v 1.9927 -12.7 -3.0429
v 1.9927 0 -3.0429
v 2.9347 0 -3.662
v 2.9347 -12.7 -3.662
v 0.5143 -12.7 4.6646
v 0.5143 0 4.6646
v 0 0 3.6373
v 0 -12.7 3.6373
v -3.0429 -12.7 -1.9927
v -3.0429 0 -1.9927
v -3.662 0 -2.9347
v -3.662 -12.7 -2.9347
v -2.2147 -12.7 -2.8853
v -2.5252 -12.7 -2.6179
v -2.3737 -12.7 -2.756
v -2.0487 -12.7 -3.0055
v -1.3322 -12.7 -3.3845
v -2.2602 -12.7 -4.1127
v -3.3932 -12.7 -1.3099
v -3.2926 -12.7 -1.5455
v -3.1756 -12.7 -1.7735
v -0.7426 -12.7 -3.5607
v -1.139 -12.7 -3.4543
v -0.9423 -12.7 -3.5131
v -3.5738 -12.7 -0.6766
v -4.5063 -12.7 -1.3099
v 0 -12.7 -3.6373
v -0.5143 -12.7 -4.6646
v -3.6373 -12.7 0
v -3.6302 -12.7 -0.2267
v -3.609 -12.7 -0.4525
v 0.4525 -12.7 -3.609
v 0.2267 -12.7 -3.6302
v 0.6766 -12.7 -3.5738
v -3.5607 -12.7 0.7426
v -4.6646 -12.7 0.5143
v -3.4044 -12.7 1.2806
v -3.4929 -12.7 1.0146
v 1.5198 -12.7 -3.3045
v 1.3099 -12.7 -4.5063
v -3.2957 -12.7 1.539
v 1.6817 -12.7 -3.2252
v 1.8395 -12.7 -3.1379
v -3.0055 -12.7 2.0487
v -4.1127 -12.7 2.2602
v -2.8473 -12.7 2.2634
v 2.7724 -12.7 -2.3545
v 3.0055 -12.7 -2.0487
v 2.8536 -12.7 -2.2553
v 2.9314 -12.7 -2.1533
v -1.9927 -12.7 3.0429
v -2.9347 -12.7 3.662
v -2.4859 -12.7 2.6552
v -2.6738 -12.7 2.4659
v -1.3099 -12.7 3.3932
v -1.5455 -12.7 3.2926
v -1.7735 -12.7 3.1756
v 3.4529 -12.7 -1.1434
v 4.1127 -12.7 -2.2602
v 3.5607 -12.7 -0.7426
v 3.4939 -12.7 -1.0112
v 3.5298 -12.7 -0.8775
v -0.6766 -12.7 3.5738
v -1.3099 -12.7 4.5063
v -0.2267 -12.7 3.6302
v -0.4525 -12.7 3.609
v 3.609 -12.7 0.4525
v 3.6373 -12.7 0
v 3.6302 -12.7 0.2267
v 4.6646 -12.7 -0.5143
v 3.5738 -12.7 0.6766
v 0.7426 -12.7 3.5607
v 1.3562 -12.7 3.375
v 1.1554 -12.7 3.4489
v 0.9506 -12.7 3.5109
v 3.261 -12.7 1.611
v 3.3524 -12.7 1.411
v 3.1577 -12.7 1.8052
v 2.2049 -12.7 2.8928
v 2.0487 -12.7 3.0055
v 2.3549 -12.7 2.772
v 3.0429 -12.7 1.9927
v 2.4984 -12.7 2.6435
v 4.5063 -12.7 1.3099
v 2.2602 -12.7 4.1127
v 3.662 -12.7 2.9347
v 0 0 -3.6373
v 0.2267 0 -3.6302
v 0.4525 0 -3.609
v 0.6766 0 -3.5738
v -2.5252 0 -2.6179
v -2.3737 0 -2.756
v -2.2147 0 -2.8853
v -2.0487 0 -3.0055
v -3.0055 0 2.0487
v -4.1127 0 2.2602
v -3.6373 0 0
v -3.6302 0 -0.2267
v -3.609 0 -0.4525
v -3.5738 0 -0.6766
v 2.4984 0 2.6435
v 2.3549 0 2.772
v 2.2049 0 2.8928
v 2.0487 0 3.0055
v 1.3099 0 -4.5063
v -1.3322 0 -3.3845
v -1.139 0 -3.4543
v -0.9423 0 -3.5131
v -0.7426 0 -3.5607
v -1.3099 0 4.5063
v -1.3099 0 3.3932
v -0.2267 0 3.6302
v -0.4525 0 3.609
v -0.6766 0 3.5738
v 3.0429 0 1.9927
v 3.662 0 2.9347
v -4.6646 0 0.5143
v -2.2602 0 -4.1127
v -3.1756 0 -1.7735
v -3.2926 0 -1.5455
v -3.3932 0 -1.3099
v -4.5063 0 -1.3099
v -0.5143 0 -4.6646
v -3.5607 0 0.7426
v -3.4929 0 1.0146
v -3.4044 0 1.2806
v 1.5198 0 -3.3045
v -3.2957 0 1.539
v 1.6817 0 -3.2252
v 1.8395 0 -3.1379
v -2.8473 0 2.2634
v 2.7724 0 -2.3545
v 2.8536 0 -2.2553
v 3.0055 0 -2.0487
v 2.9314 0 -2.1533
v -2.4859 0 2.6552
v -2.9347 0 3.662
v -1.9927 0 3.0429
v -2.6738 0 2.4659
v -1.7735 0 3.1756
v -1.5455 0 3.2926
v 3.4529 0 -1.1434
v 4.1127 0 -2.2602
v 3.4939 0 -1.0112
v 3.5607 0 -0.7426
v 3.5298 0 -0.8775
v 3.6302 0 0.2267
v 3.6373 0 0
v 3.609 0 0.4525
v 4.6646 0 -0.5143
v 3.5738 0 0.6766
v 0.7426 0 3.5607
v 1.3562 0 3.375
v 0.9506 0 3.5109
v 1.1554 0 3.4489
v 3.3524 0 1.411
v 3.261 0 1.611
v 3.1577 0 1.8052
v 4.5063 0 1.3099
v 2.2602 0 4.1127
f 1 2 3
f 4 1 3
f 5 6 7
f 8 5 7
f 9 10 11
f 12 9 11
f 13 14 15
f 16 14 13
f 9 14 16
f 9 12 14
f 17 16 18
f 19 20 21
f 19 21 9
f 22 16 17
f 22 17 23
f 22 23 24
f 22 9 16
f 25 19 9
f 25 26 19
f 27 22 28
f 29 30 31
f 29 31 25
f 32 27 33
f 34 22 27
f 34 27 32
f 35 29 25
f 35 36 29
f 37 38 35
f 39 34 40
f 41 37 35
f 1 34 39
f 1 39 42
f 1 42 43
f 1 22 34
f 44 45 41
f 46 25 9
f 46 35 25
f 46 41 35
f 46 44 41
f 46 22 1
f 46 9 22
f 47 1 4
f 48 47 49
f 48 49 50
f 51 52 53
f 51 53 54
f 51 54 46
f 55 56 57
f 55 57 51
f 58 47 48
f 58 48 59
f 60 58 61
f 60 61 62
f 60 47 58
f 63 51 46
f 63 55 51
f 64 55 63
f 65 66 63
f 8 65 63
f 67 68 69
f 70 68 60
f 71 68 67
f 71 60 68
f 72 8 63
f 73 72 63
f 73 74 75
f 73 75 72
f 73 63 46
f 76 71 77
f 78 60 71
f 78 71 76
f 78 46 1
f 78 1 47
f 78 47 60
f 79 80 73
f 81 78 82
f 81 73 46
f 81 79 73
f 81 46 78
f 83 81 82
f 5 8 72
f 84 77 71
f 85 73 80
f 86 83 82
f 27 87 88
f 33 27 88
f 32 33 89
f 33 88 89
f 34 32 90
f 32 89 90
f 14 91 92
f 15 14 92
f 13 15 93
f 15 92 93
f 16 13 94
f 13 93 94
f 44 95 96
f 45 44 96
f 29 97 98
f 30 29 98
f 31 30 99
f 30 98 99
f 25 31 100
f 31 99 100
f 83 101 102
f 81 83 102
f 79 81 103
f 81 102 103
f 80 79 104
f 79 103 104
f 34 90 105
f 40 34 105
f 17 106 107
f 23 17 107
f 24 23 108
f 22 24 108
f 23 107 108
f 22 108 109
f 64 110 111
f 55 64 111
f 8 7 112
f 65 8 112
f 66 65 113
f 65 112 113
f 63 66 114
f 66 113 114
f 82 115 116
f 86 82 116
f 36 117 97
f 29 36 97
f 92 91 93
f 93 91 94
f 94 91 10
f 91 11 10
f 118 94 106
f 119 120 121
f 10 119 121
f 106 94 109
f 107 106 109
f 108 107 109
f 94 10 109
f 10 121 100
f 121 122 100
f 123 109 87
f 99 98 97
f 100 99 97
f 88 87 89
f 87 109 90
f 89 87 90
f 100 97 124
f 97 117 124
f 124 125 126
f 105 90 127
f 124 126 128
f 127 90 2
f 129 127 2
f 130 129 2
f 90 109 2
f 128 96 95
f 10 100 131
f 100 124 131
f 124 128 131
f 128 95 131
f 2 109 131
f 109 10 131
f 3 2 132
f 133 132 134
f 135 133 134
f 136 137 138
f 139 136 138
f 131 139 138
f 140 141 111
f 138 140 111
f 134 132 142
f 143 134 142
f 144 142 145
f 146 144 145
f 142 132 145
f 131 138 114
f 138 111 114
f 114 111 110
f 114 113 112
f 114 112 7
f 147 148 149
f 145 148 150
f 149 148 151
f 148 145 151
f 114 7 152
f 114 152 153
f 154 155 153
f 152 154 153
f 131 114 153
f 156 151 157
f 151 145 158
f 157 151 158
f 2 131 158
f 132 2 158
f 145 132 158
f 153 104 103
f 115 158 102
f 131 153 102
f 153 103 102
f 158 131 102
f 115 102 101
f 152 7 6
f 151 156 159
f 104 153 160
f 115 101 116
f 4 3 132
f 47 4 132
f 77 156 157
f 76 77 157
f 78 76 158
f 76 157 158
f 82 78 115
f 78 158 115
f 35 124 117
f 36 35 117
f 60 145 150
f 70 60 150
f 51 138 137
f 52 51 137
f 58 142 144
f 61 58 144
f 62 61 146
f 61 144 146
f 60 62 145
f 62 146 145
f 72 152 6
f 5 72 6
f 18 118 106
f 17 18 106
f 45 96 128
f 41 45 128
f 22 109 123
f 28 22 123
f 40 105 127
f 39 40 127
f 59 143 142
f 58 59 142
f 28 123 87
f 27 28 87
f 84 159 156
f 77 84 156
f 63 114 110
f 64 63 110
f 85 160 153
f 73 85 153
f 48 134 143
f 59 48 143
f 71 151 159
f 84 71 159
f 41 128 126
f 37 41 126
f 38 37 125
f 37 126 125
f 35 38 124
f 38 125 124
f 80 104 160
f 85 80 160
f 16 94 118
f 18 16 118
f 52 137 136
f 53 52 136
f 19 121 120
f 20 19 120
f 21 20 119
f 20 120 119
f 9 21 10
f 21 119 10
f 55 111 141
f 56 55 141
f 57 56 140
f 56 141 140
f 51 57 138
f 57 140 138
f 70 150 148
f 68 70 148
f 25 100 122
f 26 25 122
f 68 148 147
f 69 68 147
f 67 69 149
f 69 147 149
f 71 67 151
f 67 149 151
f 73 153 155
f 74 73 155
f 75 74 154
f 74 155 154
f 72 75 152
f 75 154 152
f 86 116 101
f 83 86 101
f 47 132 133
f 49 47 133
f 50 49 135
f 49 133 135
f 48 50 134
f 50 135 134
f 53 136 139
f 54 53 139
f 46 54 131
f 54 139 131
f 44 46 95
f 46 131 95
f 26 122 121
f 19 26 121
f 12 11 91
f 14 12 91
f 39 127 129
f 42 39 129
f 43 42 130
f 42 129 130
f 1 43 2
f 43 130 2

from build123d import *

# Parameters (mm, degrees)
F1_DEPTH = 12.7


with BuildPart() as f1:
    # F0 (on Front) → F1 (new body)
    with BuildSketch(Plane.XZ):
        with BuildLine():
            ThreePointArc((3.5606706706, -0.7425834457), (3.6180769765, -0.3732623619), (3.63728, 0))
            ThreePointArc((3.63728, 0), (3.6213765163, 0.3397615722), (3.5738051364, 0.6765520271))
            ThreePointArc((3.5738051364, 0.6765520271), (3.4825423587, 1.0496211309), (3.3524499928, 1.4109871879))
            ThreePointArc((3.3524499928, 1.4109871879), (3.2108553593, 1.7088632654), (3.0428601668, 1.9926885867))
            ThreePointArc((3.0428601668, 1.9926885867), (2.7896517807, 2.3340198673), (2.498357335, 2.6434856582))
            ThreePointArc((2.498357335, 2.6434856582), (2.2807047164, 2.8334063942), (2.0486673204, 3.0054563728))
            ThreePointArc((2.0486673204, 3.0054563728), (1.7124143827, 3.2089628823), (1.3561660359, 3.3749991824))
            ThreePointArc((1.3561660359, 3.3749991824), (1.0534732185, 3.4813790337), (0.7425834457, 3.5606706706))
            Line((0.7425834457, 3.5606706706), (0, 3.63728))
            ThreePointArc((0, 3.63728), (-0.3397615722, 3.6213765163), (-0.6765520271, 3.5738051364))
            ThreePointArc((-0.6765520271, 3.5738051364), (-0.7247312416, 3.5643471248), (-0.7727783981, 3.5542396298))
            ThreePointArc((-0.7727783981, 3.5542396298), (-1.0444322734, 3.4841020399), (-1.3098719531, 3.3932346316))
            ThreePointArc((-1.3098719531, 3.3932346316), (-1.6605472279, 3.2361070289), (-1.9926885867, 3.0428601668))
            ThreePointArc((-1.9926885867, 3.0428601668), (-2.2476575865, 2.8596924961), (-2.4858819563, 2.6552206496))
            ThreePointArc((-2.4858819563, 2.6552206496), (-2.7623678061, 2.3662480643), (-3.0054563728, 2.0486673204))
            ThreePointArc((-3.0054563728, 2.0486673204), (-3.1608520437, 1.7996722357), (-3.2956657104, 1.5389585191))
            ThreePointArc((-3.2956657104, 1.5389585191), (-3.451215794, 1.1484403953), (-3.5606706706, 0.7425834457))
            ThreePointArc((-3.5606706706, 0.7425834457), (-3.6180769765, 0.3732623619), (-3.63728, 0))
            ThreePointArc((-3.63728, 0), (-3.6213765163, -0.3397615722), (-3.5738051364, -0.6765520271))
            ThreePointArc((-3.5738051364, -0.6765520271), (-3.4978828331, -0.9973071162), (-3.3932346316, -1.3098719531))
            ThreePointArc((-3.3932346316, -1.3098719531), (-3.2361070289, -1.6605472279), (-3.0428601668, -1.9926885867))
            ThreePointArc((-3.0428601668, -1.9926885867), (-2.8015066019, -2.3197772647), (-2.5251625854, -2.6178922277))
            ThreePointArc((-2.5251625854, -2.6178922277), (-2.2951103445, -2.8217502202), (-2.0486673204, -3.0054563728))
            ThreePointArc((-2.0486673204, -3.0054563728), (-1.7010031558, -3.2150262927), (-1.332151365, -3.3845499759))
            ThreePointArc((-1.332151365, -3.3845499759), (-1.0410983424, -3.4850997174), (-0.7425834457, -3.5606706706))
            ThreePointArc((-0.7425834457, -3.5606706706), (-0.3732623619, -3.6180769765), (0, -3.63728))
            ThreePointArc((0, -3.63728), (0.3397615722, -3.6213765163), (0.6765520271, -3.5738051364))
            ThreePointArc((0.6765520271, -3.5738051364), (1.1064219136, -3.4649150563), (1.5198461677, -3.3045231767))
            ThreePointArc((1.5198461677, -3.3045231767), (1.7611337209, -3.1824854777), (1.9926885867, -3.0428601668))
            ThreePointArc((1.9926885867, -3.0428601668), (2.4072483422, -2.7267125293), (2.7723506783, -2.3545440142))
            ThreePointArc((2.7723506783, -2.3545440142), (2.8929489657, -2.2046886584), (3.0054563728, -2.0486673204))
            ThreePointArc((3.0054563728, -2.0486673204), (3.2607503405, -1.6116181357), (3.4529018963, -1.1433609635))
            ThreePointArc((3.4529018963, -1.1433609635), (3.5125070381, -0.9445105112), (3.5606706706, -0.7425834457))
        make_face()
        with BuildLine():
            Line((4.6645724086, -0.514333969), (3.63728, 0))
            ThreePointArc((3.63728, 0), (3.6180769765, -0.3732623619), (3.5606706706, -0.7425834457))
            Line((3.5606706706, -0.7425834457), (4.6645724086, -0.514333969))
        make_face()
        with BuildLine():
            ThreePointArc((3.3524499928, 1.4109871879), (3.4825423587, 1.0496211309), (3.5738051364, 0.6765520271))
            Line((3.5738051364, 0.6765520271), (4.5063300649, 1.3098719531))
            Line((4.5063300649, 1.3098719531), (3.3524499928, 1.4109871879))
        make_face()
        with BuildLine():
            Line((4.1126758876, -2.2602372067), (3.4529018963, -1.1433609635))
            ThreePointArc((3.4529018963, -1.1433609635), (3.2607503405, -1.6116181357), (3.0054563728, -2.0486673204))
            Line((3.0054563728, -2.0486673204), (4.1126758876, -2.2602372067))
        make_face()
        with BuildLine():
            ThreePointArc((2.498357335, 2.6434856582), (2.7896517807, 2.3340198673), (3.0428601668, 1.9926885867))
            Line((3.0428601668, 1.9926885867), (3.6620398187, 2.9346617442))
            Line((3.6620398187, 2.9346617442), (2.498357335, 2.6434856582))
        make_face()
        with BuildLine():
            Line((2.9346617442, -3.6620398187), (2.7723506783, -2.3545440142))
            ThreePointArc((2.7723506783, -2.3545440142), (2.4072483422, -2.7267125293), (1.9926885867, -3.0428601668))
            Line((1.9926885867, -3.0428601668), (2.9346617442, -3.6620398187))
        make_face()
        with BuildLine():
            ThreePointArc((1.3561660359, 3.3749991824), (1.7124143827, 3.2089628823), (2.0486673204, 3.0054563728))
            Line((2.0486673204, 3.0054563728), (2.2602372067, 4.1126758876))
            Line((2.2602372067, 4.1126758876), (1.3561660359, 3.3749991824))
        make_face()
        with BuildLine():
            Line((1.3098719531, -4.5063300649), (1.5198461677, -3.3045231767))
            ThreePointArc((1.5198461677, -3.3045231767), (1.1064219136, -3.4649150563), (0.6765520271, -3.5738051364))
            Line((0.6765520271, -3.5738051364), (1.3098719531, -4.5063300649))
        make_face()
        with BuildLine():
            Line((0, 3.63728), (0.7425834457, 3.5606706706))
            ThreePointArc((0.7425834457, 3.5606706706), (0.3732623619, 3.6180769765), (0, 3.63728))
        make_face()
        with BuildLine():
            ThreePointArc((0, 3.63728), (0.3732623619, 3.6180769765), (0.7425834457, 3.5606706706))
            Line((0.7425834457, 3.5606706706), (0.514333969, 4.6645724086))
            Line((0.514333969, 4.6645724086), (0, 3.63728))
        make_face()
        with BuildLine():
            Line((-0.514333969, -4.6645724086), (0, -3.63728))
            ThreePointArc((0, -3.63728), (-0.3732623619, -3.6180769765), (-0.7425834457, -3.5606706706))
            Line((-0.7425834457, -3.5606706706), (-0.514333969, -4.6645724086))
        make_face()
        with BuildLine():
            ThreePointArc((-0.7727783981, 3.5542396298), (-0.7247312416, 3.5643471248), (-0.6765520271, 3.5738051364))
            Line((-0.6765520271, 3.5738051364), (-1.3098719531, 4.5063300649))
            Line((-1.3098719531, 4.5063300649), (-1.3098719531, 3.8332852884))
            Line((-1.3098719531, 3.8332852884), (-0.7727783981, 3.5542396298))
        make_face()
        with BuildLine():
            ThreePointArc((-1.3098719531, 3.3932346316), (-1.0444322734, 3.4841020399), (-0.7727783981, 3.5542396298))
            Line((-0.7727783981, 3.5542396298), (-1.3098719531, 3.8332852884))
            Line((-1.3098719531, 3.8332852884), (-1.3098719531, 3.3932346316))
        make_face()
        with BuildLine():
            Line((-2.2602372067, -4.1126758876), (-1.332151365, -3.3845499759))
            ThreePointArc((-1.332151365, -3.3845499759), (-1.7010031558, -3.2150262927), (-2.0486673204, -3.0054563728))
            Line((-2.0486673204, -3.0054563728), (-2.2602372067, -4.1126758876))
        make_face()
        with BuildLine():
            ThreePointArc((-2.4858819563, 2.6552206496), (-2.2476575865, 2.8596924961), (-1.9926885867, 3.0428601668))
            Line((-1.9926885867, 3.0428601668), (-2.9346617442, 3.6620398187))
            Line((-2.9346617442, 3.6620398187), (-2.4858819563, 2.6552206496))
        make_face()
        with BuildLine():
            Line((-3.6620398187, -2.9346617442), (-2.5251625854, -2.6178922277))
            ThreePointArc((-2.5251625854, -2.6178922277), (-2.8015066019, -2.3197772647), (-3.0428601668, -1.9926885867))
            Line((-3.0428601668, -1.9926885867), (-3.6620398187, -2.9346617442))
        make_face()
        with BuildLine():
            ThreePointArc((-3.2956657104, 1.5389585191), (-3.1608520437, 1.7996722357), (-3.0054563728, 2.0486673204))
            Line((-3.0054563728, 2.0486673204), (-4.1126758876, 2.2602372067))
            Line((-4.1126758876, 2.2602372067), (-3.2956657104, 1.5389585191))
        make_face()
        with BuildLine():
            Line((-4.5063300649, -1.3098719531), (-3.3932346316, -1.3098719531))
            ThreePointArc((-3.3932346316, -1.3098719531), (-3.4978828331, -0.9973071162), (-3.5738051364, -0.6765520271))
            Line((-3.5738051364, -0.6765520271), (-4.5063300649, -1.3098719531))
        make_face()
        with BuildLine():
            ThreePointArc((-3.63728, 0), (-3.6180769765, 0.3732623619), (-3.5606706706, 0.7425834457))
            Line((-3.5606706706, 0.7425834457), (-4.6645724086, 0.514333969))
            Line((-4.6645724086, 0.514333969), (-3.63728, 0))
        make_face()
    extrude(amount=F1_DEPTH)


solid = f1.part
